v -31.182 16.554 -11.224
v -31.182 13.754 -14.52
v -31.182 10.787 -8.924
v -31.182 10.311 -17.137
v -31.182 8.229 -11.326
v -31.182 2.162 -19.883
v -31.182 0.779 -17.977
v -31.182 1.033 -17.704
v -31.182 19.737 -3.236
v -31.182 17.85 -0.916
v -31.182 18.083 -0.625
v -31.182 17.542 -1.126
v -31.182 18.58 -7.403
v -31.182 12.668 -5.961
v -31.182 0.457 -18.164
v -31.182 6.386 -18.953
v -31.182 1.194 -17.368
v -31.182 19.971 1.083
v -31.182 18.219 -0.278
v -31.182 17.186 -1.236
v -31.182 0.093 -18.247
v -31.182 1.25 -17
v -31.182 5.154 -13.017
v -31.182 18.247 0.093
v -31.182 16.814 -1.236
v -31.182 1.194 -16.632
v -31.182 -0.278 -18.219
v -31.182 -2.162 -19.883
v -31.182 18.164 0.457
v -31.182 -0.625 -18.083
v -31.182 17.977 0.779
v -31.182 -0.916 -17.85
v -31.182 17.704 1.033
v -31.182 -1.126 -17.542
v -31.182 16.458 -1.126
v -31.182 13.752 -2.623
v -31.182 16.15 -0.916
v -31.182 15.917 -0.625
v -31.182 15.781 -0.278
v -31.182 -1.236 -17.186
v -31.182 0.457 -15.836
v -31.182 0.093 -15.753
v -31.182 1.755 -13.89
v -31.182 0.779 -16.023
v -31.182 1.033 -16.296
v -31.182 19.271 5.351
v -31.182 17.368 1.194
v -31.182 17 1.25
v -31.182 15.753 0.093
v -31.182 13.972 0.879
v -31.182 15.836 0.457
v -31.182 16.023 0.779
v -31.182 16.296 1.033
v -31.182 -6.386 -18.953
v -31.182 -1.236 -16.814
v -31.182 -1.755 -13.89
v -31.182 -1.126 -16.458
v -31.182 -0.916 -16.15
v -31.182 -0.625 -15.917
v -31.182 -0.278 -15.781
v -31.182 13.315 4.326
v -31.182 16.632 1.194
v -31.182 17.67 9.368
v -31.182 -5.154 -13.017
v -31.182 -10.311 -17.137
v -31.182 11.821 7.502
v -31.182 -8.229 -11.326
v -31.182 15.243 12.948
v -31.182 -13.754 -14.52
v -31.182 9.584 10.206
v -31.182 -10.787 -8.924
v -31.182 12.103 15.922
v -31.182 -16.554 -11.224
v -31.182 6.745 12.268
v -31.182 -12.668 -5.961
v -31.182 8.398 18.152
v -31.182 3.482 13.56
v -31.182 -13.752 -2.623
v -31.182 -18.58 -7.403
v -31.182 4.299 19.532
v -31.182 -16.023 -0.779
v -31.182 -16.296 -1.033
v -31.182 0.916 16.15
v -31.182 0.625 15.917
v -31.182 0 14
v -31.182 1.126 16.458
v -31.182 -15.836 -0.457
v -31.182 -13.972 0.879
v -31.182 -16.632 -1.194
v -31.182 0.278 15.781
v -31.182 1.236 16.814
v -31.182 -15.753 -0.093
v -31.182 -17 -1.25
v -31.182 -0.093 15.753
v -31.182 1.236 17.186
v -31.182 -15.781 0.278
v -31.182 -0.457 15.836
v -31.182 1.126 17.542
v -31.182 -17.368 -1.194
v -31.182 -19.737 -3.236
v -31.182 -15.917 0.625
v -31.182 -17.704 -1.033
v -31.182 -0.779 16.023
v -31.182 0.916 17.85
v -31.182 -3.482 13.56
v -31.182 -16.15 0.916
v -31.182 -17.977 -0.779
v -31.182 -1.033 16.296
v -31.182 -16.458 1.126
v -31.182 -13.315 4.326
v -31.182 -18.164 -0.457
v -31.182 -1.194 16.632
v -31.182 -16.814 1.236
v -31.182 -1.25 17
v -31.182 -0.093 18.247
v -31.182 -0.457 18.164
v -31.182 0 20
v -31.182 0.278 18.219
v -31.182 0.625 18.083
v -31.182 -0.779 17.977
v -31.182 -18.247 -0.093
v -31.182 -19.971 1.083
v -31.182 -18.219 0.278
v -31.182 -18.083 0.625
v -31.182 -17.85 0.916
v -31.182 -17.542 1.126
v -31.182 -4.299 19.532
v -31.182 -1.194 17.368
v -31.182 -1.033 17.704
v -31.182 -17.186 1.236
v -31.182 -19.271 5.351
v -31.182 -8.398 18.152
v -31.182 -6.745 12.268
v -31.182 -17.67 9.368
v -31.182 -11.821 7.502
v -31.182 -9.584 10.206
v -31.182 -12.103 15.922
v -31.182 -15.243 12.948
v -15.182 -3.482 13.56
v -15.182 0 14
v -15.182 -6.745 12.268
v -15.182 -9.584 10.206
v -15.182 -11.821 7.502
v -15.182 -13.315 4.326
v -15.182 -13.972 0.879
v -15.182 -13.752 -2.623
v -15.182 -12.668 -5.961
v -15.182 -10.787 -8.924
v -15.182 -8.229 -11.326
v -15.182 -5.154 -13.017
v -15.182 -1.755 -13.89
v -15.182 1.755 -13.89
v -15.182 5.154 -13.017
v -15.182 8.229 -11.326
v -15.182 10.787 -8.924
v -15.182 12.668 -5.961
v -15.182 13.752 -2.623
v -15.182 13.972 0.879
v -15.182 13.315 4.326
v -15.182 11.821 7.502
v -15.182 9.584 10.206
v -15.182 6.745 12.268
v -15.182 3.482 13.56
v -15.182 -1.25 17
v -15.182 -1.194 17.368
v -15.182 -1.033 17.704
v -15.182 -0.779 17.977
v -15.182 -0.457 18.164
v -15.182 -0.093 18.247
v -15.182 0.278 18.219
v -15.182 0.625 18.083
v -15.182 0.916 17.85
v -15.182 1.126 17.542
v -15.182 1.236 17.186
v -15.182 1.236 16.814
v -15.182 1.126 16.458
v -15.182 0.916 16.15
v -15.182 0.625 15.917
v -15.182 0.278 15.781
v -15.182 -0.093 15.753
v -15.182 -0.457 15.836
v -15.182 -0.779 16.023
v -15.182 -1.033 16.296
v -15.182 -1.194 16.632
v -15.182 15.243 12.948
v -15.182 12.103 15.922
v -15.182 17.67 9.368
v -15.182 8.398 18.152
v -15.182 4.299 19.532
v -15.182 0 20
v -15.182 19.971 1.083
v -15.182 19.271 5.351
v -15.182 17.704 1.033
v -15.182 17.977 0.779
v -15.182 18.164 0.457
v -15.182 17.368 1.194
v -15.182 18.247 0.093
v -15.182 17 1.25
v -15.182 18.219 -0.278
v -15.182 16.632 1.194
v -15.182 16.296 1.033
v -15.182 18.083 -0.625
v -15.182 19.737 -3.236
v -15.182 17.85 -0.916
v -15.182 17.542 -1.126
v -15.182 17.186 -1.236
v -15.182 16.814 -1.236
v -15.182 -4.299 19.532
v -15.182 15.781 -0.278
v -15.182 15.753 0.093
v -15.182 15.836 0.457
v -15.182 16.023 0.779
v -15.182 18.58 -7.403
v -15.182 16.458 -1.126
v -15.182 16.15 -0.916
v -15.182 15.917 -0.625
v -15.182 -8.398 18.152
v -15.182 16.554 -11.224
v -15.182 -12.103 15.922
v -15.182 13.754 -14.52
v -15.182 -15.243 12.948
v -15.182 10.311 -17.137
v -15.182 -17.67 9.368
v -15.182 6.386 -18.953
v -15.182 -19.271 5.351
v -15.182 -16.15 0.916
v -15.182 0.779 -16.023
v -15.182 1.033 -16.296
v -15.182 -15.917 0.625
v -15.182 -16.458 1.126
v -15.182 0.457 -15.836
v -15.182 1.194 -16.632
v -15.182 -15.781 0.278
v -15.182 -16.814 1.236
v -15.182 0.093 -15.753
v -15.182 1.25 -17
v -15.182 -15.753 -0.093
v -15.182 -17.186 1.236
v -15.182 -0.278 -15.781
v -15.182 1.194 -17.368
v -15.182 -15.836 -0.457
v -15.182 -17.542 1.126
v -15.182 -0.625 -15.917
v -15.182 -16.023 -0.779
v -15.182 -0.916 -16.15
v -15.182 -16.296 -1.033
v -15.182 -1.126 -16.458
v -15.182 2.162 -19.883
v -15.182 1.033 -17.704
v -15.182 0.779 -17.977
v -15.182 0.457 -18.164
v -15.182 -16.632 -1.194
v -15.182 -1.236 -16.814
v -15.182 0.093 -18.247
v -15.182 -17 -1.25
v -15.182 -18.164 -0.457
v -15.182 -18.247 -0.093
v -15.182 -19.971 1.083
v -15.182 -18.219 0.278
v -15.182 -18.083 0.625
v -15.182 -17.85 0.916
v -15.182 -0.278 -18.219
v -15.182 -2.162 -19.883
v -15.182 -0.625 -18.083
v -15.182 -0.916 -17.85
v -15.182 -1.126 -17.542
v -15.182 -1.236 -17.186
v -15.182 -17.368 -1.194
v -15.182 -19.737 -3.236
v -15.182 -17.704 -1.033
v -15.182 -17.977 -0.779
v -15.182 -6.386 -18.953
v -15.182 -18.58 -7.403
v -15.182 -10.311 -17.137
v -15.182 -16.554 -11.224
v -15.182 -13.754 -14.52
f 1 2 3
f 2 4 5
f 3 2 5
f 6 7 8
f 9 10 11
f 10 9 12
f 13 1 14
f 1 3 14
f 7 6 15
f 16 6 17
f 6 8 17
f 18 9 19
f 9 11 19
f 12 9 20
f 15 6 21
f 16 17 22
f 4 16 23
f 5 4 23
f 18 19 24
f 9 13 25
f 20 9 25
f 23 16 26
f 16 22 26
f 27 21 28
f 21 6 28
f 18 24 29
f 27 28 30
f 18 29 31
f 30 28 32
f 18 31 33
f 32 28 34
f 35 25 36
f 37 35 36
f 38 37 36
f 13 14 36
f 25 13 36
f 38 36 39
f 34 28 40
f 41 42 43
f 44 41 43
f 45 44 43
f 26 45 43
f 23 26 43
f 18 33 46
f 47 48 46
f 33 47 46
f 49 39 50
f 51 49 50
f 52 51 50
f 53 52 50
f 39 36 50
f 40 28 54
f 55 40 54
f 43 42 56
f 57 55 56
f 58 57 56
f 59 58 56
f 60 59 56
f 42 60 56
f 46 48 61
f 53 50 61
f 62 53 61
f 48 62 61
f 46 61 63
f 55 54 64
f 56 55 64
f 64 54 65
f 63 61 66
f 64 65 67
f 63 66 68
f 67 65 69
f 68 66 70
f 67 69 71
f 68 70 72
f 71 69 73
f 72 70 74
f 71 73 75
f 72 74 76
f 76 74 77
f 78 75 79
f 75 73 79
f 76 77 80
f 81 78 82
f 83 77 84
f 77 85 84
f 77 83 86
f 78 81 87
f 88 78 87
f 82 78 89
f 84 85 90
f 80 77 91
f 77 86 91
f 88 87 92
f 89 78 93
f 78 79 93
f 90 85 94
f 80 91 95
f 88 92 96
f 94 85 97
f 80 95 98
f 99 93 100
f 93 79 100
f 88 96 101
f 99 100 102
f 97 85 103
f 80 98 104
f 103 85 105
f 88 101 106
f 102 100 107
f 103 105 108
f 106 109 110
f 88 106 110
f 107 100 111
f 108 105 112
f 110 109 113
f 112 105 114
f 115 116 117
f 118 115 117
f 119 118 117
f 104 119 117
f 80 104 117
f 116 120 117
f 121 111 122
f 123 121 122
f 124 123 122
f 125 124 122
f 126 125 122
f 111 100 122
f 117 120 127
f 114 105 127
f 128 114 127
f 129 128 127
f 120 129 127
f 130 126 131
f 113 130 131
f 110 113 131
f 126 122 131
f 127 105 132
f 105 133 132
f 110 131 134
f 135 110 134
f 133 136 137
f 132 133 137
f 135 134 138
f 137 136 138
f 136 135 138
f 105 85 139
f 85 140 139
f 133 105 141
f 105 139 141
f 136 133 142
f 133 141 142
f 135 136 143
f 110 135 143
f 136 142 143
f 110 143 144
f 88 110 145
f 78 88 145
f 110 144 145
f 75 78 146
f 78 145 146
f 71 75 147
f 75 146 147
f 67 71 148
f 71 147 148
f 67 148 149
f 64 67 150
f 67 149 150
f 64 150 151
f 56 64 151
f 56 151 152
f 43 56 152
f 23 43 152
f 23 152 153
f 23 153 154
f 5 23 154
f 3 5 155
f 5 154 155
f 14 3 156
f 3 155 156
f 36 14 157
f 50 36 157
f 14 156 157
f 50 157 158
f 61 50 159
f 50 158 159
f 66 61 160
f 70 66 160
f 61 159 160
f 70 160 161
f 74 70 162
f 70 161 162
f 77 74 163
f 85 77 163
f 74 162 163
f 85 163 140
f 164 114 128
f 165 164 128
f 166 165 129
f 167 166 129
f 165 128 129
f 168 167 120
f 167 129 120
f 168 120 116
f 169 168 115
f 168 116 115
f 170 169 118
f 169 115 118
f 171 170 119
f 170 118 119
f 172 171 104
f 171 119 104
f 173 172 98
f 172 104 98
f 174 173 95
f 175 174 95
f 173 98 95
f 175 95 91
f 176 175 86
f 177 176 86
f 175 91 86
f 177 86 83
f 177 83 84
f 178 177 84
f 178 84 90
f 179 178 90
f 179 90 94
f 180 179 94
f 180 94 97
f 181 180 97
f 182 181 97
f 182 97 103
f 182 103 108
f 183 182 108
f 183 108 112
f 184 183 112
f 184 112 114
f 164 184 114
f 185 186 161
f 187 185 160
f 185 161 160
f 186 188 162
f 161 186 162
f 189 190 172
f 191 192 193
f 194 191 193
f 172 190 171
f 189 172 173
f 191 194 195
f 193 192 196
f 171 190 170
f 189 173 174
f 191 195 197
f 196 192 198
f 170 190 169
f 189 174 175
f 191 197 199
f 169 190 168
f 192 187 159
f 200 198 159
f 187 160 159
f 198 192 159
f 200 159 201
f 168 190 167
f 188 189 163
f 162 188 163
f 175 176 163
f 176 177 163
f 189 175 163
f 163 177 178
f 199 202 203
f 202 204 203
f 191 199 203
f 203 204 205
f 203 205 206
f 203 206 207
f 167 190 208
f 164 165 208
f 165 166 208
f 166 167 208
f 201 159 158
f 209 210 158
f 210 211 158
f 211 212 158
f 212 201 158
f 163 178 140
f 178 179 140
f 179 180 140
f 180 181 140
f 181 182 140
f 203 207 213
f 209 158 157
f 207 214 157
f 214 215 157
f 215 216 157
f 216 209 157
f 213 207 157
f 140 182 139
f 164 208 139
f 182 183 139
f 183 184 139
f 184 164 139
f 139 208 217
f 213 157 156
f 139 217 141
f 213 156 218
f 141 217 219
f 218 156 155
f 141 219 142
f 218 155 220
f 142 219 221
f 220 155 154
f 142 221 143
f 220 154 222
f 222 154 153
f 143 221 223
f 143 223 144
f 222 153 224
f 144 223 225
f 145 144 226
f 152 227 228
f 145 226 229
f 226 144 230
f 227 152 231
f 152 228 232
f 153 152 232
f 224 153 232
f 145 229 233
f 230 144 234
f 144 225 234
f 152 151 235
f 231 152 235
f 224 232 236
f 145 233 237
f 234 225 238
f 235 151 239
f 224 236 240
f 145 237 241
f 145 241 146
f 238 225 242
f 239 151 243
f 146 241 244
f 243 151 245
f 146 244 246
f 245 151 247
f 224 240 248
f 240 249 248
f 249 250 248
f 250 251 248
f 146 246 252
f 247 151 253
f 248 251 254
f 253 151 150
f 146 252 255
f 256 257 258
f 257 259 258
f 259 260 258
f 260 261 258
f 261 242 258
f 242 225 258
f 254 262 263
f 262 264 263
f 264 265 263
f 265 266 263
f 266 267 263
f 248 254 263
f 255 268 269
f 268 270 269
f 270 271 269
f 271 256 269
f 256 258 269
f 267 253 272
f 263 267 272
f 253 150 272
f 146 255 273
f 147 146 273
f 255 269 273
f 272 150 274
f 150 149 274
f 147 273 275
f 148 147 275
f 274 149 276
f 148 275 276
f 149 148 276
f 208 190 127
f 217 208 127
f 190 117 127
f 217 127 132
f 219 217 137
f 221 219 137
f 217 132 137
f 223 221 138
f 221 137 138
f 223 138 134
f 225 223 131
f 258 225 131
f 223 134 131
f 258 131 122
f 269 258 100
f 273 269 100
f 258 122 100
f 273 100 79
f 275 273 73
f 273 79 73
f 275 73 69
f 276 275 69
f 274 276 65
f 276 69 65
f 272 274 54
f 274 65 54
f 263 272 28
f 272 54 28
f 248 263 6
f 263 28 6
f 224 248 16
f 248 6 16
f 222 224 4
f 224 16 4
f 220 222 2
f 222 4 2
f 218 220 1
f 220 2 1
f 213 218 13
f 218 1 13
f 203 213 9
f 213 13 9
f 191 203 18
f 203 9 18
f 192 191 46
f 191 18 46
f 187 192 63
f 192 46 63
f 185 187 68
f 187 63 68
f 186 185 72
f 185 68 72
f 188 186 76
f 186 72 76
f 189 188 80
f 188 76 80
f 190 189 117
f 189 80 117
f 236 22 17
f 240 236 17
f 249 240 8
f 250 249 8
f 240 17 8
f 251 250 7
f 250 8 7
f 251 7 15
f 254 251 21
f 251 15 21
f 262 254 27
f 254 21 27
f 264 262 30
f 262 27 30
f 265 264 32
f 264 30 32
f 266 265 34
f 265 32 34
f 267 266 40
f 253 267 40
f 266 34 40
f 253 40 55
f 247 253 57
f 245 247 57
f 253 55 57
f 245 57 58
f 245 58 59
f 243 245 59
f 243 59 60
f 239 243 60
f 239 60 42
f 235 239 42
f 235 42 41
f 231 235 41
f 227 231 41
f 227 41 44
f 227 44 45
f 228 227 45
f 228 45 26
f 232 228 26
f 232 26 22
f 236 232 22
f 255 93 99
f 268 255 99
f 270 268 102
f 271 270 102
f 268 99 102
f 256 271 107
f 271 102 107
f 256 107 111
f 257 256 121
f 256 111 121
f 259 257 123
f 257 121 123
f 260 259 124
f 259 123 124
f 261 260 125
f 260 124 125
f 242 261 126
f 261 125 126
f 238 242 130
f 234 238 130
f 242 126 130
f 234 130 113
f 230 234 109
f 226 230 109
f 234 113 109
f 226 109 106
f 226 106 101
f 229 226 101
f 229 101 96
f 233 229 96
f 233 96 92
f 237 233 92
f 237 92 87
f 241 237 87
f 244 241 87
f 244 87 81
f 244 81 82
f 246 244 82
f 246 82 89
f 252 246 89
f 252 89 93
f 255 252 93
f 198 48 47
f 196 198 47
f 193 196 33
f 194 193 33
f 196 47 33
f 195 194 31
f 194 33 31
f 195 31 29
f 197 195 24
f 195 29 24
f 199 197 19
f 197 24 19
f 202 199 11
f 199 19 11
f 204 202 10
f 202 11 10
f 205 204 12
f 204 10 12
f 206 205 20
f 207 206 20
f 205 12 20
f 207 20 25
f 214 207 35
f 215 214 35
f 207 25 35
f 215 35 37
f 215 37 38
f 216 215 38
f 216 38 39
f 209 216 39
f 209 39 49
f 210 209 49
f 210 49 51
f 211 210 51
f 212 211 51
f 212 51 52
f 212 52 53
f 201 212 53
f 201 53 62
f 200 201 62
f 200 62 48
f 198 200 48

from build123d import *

# Parameters (mm, degrees)
M3_GEWINDEBOHRUNG1_D = 2.5
KREISMUSTER2_COUNT   = 4


with BuildPart() as part:
    # Skizze1 → Rotation1 (revolve)
    with BuildSketch(Plane.XY):
        Polygon((-31.181837907, 20), (-31.181837907, 14), (-29.181837907, 14), (-15.181837907, 14), (-15.181837907, 20), align=None)
    revolve(axis=Axis((-37.668433178, 0, 0), (1, 0, 0)))

    # M3 Gewindebohrung1 (through all)
    with Locations(Plane(origin=(-15.181837907, 0, 0), x_dir=(0, 0, -1), z_dir=(1, 0, 0))):
        with Locations((0, 17)):
            m3_gewindebohrung1 = Hole(M3_GEWINDEBOHRUNG1_D / 2)

    # Kreismuster2: M3 Gewindebohrung1 ×4 about axis
    kreismuster2_axis = Axis((-15.181837907, 0, 0), (-1, 0, 0))
    for i in range(1, KREISMUSTER2_COUNT):
        add(m3_gewindebohrung1.rotate(kreismuster2_axis, i * 360 / KREISMUSTER2_COUNT), mode=Mode.SUBTRACT)


solid = part.part
